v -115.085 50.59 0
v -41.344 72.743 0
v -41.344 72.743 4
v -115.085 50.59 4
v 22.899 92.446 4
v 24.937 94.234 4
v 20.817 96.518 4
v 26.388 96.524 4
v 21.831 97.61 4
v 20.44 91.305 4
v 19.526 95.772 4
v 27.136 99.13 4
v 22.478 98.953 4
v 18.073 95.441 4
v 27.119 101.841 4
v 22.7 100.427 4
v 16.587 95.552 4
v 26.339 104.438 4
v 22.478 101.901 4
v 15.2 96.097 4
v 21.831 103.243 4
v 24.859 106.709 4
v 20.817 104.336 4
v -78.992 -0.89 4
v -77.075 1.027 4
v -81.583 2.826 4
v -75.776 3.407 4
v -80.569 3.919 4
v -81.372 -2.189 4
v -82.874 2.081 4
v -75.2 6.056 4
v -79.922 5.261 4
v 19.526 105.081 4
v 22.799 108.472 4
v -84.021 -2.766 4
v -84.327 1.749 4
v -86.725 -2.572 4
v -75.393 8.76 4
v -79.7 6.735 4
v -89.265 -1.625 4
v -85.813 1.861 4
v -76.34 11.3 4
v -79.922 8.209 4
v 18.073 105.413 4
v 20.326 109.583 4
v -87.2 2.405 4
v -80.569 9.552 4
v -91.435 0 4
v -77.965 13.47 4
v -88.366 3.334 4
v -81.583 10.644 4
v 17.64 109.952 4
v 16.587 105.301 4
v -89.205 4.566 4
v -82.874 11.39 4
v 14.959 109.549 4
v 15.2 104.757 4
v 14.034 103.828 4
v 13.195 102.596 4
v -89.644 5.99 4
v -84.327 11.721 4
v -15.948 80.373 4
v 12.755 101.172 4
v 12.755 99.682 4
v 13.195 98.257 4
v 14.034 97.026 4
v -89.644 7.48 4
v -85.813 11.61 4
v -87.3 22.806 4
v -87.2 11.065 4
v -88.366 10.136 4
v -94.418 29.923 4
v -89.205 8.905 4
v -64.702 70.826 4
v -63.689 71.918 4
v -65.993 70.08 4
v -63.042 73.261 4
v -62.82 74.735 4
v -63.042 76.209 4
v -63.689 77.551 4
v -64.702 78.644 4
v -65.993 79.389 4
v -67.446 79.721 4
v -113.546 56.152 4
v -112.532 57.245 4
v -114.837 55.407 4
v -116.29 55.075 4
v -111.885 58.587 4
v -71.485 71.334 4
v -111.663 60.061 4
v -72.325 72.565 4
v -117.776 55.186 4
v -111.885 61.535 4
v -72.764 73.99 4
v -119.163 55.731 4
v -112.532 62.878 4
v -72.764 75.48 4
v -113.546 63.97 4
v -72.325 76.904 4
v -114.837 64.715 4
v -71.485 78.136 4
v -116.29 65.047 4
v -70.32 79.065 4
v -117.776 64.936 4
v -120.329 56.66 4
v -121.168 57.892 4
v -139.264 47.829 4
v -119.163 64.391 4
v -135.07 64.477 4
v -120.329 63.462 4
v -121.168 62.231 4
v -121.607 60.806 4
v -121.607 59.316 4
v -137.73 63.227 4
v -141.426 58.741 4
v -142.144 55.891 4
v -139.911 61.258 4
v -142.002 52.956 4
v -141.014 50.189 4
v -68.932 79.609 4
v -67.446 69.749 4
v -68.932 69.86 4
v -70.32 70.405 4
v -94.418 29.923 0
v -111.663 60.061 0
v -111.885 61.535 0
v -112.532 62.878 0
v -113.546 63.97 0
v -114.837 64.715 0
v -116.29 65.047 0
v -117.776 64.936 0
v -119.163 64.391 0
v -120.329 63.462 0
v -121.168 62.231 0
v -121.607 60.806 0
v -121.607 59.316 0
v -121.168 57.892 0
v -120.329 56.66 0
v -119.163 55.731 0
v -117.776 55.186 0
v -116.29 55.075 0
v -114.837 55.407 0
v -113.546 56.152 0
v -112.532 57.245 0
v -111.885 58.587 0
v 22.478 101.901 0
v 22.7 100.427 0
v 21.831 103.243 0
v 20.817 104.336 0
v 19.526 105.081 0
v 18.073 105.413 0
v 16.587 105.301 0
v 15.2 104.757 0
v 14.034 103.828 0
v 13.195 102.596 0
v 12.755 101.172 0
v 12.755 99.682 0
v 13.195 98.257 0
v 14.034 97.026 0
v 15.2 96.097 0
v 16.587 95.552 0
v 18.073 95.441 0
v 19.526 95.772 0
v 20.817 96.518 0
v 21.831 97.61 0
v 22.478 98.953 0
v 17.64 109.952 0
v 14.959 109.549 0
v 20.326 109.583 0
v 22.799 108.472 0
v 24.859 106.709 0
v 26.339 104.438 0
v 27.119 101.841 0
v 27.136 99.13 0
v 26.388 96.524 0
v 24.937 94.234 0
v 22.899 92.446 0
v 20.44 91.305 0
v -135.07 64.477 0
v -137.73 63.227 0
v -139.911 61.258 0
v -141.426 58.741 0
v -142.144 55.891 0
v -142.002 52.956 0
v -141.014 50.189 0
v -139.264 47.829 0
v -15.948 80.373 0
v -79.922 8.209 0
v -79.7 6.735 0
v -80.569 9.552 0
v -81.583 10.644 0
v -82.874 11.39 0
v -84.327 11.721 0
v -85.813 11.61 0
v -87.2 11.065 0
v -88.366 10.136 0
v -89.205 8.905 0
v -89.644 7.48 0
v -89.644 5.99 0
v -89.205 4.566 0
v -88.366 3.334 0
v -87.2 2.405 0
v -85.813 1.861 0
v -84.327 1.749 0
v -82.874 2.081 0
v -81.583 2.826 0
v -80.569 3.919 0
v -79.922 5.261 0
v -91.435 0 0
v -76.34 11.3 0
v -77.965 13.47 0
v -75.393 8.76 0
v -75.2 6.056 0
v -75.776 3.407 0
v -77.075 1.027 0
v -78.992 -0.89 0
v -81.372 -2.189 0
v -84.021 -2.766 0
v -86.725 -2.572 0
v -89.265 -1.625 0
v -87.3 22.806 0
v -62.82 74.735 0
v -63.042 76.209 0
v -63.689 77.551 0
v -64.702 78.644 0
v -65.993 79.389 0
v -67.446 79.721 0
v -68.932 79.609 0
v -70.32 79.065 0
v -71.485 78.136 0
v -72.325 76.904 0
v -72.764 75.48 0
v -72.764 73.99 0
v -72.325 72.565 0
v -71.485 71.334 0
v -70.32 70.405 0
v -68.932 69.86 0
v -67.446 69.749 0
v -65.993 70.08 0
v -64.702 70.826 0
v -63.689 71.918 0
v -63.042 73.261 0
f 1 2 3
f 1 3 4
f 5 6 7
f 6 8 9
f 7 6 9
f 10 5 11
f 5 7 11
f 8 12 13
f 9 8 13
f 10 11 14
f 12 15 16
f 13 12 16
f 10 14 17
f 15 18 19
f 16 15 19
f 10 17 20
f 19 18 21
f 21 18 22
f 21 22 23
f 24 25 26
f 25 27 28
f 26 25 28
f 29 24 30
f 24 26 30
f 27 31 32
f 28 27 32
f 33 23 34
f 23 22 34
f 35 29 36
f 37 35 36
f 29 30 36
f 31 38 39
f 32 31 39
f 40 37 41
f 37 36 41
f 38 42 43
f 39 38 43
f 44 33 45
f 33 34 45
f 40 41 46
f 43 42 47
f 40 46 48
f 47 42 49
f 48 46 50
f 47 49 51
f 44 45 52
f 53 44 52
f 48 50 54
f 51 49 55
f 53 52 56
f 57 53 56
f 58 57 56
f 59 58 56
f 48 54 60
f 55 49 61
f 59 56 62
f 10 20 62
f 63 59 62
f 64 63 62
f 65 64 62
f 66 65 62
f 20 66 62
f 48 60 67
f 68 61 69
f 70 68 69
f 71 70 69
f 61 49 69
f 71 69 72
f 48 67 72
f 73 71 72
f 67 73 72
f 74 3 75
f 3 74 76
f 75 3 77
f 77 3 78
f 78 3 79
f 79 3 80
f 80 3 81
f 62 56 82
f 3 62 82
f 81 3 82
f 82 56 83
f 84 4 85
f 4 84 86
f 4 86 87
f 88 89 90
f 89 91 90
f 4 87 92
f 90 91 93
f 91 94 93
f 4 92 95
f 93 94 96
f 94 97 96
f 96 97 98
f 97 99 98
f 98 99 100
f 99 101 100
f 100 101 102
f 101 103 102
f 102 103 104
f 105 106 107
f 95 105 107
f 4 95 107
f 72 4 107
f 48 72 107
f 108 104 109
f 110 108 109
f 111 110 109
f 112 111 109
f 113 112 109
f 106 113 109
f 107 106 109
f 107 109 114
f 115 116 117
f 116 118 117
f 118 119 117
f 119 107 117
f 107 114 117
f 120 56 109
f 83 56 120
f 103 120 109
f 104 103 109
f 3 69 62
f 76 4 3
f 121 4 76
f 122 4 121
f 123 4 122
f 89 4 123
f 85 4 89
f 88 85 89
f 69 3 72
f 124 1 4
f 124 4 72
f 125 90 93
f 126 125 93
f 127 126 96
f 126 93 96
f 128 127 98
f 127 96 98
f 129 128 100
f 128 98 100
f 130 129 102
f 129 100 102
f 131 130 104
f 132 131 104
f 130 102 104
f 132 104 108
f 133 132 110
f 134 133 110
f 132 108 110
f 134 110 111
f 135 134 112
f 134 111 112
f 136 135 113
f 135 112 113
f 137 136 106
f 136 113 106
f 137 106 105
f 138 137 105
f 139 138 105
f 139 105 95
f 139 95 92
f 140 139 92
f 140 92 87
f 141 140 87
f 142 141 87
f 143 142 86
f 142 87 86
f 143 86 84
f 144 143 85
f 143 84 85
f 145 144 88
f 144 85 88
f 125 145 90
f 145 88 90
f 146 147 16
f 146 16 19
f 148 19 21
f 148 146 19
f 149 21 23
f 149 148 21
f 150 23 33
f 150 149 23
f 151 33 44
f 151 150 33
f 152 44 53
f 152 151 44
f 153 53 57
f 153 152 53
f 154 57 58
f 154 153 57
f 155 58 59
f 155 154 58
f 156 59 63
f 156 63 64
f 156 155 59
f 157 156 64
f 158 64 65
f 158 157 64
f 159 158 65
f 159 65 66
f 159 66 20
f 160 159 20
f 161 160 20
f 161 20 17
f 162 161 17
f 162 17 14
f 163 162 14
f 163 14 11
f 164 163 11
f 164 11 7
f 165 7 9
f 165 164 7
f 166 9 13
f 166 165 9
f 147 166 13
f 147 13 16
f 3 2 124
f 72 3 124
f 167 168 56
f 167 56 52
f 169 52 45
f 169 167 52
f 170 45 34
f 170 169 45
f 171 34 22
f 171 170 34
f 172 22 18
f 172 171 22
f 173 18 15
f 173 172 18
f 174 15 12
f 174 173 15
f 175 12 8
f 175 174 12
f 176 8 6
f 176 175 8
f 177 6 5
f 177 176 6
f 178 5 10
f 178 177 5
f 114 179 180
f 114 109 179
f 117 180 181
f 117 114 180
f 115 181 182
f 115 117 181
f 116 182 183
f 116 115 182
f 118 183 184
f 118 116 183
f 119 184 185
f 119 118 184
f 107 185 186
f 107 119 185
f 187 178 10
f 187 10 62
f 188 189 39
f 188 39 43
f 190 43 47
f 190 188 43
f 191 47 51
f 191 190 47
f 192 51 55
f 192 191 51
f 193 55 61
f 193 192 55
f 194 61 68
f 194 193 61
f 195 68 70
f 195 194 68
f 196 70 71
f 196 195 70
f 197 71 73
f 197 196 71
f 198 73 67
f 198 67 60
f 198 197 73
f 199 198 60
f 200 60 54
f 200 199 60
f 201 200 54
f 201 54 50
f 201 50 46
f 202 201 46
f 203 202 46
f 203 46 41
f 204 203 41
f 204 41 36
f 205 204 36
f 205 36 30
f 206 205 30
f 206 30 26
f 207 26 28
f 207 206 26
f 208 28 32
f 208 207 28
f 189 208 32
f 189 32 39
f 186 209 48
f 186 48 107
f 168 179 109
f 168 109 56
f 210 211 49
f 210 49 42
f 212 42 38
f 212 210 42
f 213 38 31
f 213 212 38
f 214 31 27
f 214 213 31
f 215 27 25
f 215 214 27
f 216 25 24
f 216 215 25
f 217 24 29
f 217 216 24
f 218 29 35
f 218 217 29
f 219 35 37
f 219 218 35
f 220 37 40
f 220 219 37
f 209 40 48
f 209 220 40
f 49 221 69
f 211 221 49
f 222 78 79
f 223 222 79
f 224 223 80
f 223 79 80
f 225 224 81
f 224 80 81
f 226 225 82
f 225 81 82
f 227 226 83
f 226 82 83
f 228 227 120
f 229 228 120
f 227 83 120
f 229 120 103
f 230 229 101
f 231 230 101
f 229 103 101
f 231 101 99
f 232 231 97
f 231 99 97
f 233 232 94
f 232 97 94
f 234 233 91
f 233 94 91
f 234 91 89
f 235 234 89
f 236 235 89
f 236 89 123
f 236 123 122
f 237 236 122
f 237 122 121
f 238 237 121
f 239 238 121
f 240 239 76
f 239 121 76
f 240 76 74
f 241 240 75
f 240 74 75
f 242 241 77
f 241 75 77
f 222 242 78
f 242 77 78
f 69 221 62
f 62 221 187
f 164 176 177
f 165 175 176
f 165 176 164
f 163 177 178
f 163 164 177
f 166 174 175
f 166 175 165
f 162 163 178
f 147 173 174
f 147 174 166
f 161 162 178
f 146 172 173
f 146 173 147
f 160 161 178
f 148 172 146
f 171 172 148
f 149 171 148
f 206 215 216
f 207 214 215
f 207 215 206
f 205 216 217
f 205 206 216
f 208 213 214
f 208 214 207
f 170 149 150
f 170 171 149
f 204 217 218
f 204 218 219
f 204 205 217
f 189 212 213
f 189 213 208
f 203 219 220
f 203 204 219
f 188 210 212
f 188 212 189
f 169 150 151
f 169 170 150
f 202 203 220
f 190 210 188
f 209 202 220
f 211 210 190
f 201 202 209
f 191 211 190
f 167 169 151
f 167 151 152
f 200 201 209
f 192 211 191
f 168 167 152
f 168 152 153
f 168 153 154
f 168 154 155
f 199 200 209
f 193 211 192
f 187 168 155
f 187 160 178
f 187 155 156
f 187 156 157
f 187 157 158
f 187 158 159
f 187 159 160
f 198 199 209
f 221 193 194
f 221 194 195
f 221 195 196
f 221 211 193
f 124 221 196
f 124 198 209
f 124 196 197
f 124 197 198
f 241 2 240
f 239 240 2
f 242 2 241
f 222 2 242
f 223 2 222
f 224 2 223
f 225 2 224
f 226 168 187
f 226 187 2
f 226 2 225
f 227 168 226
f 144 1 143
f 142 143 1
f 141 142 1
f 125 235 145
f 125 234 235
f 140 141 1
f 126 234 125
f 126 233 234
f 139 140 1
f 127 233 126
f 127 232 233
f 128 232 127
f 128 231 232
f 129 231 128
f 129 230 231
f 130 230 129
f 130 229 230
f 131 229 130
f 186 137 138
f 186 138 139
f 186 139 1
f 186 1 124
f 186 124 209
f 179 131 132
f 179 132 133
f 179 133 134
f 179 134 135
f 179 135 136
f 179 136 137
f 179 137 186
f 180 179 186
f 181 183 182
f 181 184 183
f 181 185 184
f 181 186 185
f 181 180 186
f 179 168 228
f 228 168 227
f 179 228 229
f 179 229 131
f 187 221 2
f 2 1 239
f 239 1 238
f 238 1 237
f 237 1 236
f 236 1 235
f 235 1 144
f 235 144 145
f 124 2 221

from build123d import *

# Parameters (mm, degrees)
SKETCH2_R           = 5
BOSS_EXTRUDE3_DEPTH = 4
FILLET3_R           = 10
SKETCH5_R           = 5
CUT_EXTRUDE3_DEPTH  = 4


with BuildPart() as part:
    # Sketch2 → Boss-Extrude3 (new body)
    # profile 1 of 2: a face of its own
    with BuildSketch(Plane.XY):
        with BuildLine():
            ThreePointArc((14.959120664, 109.549078448), (26.821882285, 103.16737517), (20.440179007, 91.304613549))
            Line((20.440179007, 91.304613549), (-115.084548239, 50.589857539))
            Line((-115.084548239, 50.589857539), (-77.965074882, 13.470384182))
            ThreePointArc((-77.965074882, 13.470384182), (-77.965074882, 0), (-91.435459064, 0))
            Line((-91.435459064, 0), (-151.097343154, 59.661884091))
            Line((-151.097343154, 59.661884091), (14.959120664, 109.549078448))
        make_face()
        with Locations((17.699649835, 100.426845999)):
            Circle(SKETCH2_R, mode=Mode.SUBTRACT)
        with Locations((-84.700266973, 6.735192091)):
            Circle(SKETCH2_R, mode=Mode.SUBTRACT)
    # profile 2 of 2: a face of its own
    with BuildSketch(Plane.XY):
        Polygon((-94.417910685, 29.923219984), (-87.300193609, 22.805502909), (-15.947819408, 80.372818981), (-41.344385101, 72.743104488), align=None)
    extrude(amount=BOSS_EXTRUDE3_DEPTH)

    # Fillet3
    fillet3_edges = [part.edges().sort_by_distance(p)[0] for p in [
        (-151.097343154, 59.661884091, 2),
    ]]
    fillet(fillet3_edges, radius=FILLET3_R)

    # Sketch5 → Cut-Extrude3 (cut)
    with BuildSketch(Plane.XY.offset(4)):
        with Locations((-116.663330616, 60.061105539)):
            Circle(SKETCH5_R)
        with Locations((-67.81988128, 74.734805039)):
            Circle(SKETCH5_R)
    extrude(amount=-CUT_EXTRUDE3_DEPTH, mode=Mode.SUBTRACT)


solid = part.part
